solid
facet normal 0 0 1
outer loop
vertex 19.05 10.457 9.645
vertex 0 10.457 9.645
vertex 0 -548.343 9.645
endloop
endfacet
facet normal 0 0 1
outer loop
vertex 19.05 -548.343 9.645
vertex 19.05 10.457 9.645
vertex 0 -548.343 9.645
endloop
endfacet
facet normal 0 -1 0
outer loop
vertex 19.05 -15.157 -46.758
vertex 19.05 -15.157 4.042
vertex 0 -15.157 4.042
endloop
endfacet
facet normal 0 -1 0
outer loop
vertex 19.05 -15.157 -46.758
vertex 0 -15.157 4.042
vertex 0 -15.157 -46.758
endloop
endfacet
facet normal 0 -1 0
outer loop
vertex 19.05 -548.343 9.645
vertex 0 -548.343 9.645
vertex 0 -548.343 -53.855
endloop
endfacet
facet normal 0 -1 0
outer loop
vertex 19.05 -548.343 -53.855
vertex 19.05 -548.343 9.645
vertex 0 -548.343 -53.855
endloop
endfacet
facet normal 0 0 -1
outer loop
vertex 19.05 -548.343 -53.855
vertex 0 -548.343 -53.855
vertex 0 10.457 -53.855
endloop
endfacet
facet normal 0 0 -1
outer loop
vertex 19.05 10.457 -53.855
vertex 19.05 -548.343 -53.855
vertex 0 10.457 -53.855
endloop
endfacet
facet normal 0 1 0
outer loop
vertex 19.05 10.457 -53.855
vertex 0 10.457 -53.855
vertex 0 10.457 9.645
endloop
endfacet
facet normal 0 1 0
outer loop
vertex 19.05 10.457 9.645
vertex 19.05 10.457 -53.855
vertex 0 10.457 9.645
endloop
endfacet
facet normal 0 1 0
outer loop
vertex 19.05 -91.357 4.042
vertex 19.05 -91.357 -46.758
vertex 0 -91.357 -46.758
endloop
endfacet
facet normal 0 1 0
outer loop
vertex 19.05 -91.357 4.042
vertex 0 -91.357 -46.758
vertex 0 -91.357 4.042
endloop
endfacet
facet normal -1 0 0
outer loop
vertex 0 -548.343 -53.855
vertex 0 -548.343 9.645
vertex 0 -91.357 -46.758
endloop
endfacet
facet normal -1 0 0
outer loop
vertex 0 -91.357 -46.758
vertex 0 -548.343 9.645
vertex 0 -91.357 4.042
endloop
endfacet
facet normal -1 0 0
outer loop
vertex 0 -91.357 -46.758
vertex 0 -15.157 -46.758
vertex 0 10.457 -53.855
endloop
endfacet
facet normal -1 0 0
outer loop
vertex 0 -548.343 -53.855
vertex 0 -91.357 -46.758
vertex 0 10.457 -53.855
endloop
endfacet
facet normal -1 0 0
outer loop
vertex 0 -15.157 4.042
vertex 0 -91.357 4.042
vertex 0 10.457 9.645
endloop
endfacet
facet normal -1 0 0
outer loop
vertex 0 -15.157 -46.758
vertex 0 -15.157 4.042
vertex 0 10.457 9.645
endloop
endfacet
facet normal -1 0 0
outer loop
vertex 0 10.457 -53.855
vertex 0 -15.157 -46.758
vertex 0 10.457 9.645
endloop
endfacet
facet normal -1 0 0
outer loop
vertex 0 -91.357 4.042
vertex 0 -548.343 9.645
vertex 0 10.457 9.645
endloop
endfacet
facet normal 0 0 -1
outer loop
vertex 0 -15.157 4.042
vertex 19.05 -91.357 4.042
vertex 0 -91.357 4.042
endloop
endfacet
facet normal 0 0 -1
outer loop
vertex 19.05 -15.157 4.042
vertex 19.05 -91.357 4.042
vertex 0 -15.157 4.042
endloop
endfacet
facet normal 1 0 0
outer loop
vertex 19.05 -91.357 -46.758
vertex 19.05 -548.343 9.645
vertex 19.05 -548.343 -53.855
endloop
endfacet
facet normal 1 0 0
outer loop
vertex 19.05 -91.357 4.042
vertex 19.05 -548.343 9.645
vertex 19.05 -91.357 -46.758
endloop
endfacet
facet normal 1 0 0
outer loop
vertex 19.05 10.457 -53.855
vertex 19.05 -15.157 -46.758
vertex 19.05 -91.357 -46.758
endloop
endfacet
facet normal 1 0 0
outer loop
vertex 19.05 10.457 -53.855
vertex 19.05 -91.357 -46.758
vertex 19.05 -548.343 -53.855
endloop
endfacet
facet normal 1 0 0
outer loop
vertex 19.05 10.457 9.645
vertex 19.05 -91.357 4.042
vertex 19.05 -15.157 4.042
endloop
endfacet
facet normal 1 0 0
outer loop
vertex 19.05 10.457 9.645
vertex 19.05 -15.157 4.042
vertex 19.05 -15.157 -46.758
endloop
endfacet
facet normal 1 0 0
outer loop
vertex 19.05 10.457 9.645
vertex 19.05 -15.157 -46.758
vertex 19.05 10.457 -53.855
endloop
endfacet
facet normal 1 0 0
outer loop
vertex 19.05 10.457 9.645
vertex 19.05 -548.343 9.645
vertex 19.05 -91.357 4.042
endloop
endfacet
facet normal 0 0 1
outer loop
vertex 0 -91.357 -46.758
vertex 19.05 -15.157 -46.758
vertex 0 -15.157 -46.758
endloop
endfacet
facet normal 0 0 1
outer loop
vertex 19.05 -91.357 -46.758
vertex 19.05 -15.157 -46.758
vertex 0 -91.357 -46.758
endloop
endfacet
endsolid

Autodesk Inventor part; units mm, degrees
ref_plane "YZ Plane" through (0, 0, 0) normal (1, 0, 0) x (0, 1, 0)
ref_plane "XZ Plane" through (0, 0, 0) normal (0, 1, 0) x (-1, 0, 0)
ref_plane "XY Plane" through (0, 0, 0) normal (0, 0, 1) x (1, 0, 0)
sketch "Sketch1" plane through (0, 0, 0) normal (1, 0, 0) x (0, 1, 0)
  line L0 (10.4573, 9.6454) -> (-548.3427, 9.6454)
  line L1 (-548.3427, 9.6454) -> (-548.3427, -53.8546)
  line L2 (-548.3427, -53.8546) -> (10.4573, -53.8546)
  line L3 (10.4573, -53.8546) -> (10.4573, 9.6454)
  point P0 (0, 0)
  dimension "d0" = 558.8
  dimension "d1" = 63.5
extrude "Extrusion1" add sketch "Sketch1" along normal blind 19.05
sketch "Sketch2" plane through (19.05, 0, 0) normal (1, 0, 0) x (0, 0, -1)
  line L0 (-4.0419, -15.157) -> (46.7581, -15.157)
  line L1 (46.7581, -15.157) -> (46.7581, -91.357)
  line L2 (46.7581, -91.357) -> (-4.0419, -91.357)
  line L3 (-4.0419, -91.357) -> (-4.0419, -15.157)
  point P0 (0, 0)
  dimension "d4" = 50.8
  dimension "d5" = 76.2
extrude "Extrusion2" cut sketch "Sketch2" against normal blind 19.05
properties part number "blade" material "Rubber, Silicone"
